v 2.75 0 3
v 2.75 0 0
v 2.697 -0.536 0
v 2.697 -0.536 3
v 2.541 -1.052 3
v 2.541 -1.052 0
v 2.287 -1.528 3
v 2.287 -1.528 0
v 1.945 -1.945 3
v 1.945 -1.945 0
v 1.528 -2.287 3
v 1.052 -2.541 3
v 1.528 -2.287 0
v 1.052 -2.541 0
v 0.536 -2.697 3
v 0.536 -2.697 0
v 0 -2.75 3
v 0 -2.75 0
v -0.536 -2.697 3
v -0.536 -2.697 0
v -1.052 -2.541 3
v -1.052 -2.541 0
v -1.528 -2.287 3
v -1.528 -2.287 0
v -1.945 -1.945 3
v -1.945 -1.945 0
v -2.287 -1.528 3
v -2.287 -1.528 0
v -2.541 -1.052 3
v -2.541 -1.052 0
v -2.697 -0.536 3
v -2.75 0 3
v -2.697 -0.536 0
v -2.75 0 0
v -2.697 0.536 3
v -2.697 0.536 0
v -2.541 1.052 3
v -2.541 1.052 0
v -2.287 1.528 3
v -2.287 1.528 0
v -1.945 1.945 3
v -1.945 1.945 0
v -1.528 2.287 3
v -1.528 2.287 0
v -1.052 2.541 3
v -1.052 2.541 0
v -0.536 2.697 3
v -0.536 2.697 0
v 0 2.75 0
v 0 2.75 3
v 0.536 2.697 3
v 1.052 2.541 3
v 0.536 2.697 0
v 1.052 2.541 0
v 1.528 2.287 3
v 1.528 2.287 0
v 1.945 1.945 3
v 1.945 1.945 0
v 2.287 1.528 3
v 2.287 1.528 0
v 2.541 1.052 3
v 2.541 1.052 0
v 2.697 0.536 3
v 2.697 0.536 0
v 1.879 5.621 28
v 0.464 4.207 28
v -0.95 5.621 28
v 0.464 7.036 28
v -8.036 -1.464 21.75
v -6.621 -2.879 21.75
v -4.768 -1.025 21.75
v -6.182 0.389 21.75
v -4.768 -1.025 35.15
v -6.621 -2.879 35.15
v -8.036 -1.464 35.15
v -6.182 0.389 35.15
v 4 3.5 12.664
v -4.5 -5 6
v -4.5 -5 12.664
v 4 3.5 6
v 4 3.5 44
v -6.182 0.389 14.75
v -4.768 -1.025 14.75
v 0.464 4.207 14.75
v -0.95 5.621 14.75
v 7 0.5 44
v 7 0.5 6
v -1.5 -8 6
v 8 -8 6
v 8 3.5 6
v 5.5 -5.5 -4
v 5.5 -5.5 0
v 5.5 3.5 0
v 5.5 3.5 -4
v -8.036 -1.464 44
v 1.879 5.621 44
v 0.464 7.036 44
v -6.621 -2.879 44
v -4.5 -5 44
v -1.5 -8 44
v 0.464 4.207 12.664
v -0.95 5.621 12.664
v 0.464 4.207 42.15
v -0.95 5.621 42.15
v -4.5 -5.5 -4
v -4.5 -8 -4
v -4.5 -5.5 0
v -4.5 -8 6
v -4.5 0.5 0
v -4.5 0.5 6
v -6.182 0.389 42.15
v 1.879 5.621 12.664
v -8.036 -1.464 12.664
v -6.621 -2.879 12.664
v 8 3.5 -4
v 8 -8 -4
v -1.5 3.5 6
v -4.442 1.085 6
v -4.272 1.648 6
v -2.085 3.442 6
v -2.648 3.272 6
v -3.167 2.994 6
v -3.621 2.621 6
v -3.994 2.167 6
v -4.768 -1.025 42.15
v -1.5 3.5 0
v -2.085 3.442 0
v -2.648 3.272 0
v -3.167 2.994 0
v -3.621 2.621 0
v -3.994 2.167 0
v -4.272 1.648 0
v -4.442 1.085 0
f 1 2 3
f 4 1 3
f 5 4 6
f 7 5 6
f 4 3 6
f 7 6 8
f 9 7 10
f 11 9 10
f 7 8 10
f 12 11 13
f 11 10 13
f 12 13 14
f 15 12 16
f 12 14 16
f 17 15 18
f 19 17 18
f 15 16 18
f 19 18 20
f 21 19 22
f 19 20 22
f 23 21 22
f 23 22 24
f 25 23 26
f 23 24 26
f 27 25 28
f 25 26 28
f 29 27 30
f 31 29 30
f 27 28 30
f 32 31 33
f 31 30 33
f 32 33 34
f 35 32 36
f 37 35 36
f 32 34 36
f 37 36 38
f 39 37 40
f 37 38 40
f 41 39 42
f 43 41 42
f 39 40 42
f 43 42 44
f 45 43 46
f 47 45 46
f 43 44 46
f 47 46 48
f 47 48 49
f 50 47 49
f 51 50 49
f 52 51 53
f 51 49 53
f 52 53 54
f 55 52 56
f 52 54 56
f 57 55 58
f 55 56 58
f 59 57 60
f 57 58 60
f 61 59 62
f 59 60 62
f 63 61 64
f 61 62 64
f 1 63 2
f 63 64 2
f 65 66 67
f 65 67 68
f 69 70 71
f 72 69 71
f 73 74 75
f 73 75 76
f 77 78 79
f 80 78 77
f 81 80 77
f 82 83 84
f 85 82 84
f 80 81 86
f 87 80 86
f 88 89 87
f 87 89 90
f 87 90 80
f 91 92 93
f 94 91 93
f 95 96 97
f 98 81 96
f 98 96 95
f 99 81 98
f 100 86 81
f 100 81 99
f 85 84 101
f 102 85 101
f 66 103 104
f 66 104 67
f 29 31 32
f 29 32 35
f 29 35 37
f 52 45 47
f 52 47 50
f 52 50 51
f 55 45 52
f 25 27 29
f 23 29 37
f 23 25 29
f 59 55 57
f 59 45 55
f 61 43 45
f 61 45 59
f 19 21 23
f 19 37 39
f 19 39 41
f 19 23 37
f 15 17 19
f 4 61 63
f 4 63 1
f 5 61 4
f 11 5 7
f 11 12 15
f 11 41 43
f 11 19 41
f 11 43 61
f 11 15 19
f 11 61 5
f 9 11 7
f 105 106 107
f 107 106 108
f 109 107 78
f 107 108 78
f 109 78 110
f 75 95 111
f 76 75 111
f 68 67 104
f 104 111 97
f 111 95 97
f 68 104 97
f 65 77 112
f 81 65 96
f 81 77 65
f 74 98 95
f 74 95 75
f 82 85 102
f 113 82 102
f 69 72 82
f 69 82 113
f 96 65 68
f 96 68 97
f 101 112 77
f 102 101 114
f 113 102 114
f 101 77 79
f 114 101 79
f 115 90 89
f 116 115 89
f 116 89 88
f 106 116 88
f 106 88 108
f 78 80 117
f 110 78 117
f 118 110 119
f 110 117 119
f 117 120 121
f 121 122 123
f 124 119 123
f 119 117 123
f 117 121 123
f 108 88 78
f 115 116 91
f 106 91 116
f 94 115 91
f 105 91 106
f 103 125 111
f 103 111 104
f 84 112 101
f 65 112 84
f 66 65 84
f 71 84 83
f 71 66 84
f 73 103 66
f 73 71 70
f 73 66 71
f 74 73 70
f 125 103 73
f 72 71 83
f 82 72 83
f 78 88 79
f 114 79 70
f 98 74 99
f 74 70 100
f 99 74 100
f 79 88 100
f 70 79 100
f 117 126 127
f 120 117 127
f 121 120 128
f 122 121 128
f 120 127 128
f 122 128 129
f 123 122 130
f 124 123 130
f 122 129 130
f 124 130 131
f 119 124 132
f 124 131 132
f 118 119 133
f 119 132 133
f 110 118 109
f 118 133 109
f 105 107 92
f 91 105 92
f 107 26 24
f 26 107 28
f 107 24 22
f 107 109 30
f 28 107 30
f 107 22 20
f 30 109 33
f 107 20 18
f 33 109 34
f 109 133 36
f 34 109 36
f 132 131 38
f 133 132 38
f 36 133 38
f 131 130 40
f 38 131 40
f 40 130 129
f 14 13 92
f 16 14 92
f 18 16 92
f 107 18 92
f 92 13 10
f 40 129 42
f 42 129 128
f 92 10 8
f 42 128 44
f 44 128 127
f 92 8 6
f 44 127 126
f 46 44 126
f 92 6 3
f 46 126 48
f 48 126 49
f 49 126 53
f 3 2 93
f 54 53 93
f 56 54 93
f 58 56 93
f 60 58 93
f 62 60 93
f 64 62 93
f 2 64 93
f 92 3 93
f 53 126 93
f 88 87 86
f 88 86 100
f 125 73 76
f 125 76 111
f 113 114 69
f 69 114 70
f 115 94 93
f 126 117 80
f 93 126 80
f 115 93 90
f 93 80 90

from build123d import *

# Parameters (mm, degrees)
PAD003_DEPTH    = 6
PAD022_DEPTH    = 10
SKETCH041_R     = 2.75
POCKET007_DEPTH = 3
PAD023_DEPTH    = 38
SKETCH043_W     = 12.020815
SKETCH043_H     = 31.3359
PAD024_DEPTH    = 3
PAD025_DEPTH    = 2


with BuildPart() as part:
    # Sketch013 → Pad003 (new body)
    with BuildSketch(Plane.XY):
        with BuildLine():
            Line((5.5, -5.5), (5.5, 3.5))
            Line((5.5, 3.5), (-1.5, 3.5))
            ThreePointArc((-1.5, 3.5), (-3.62132, 2.62132), (-4.5, 0.5))
            Line((-4.5, 0.5), (-4.5, -5.5))
            Line((-4.5, -5.5), (5.5, -5.5))
        make_face()
    extrude(amount=PAD003_DEPTH)

    # Sketch040 (on Face7 of Pad003) → Pad022 (new body)
    with BuildSketch(Plane.XY.offset(6)):
        Polygon((5.5, 3.5), (8, 3.5), (8, -8), (-4.5, -8), (-4.5, -5.5), (5.5, -5.5), align=None)
    extrude(amount=-PAD022_DEPTH)

    # Sketch041 (on Face4 of Pad022) → Pocket007 (cut)
    with BuildSketch(Plane(origin=(0, 0, 0), x_dir=(1, 0, 0), z_dir=(0, 0, -1))):
        Circle(SKETCH041_R)
    extrude(amount=-POCKET007_DEPTH, mode=Mode.SUBTRACT)

    # Sketch042 (on Face4 of Pocket007) → Pad023 (new body)
    with BuildSketch(Plane.XY.offset(6)):
        Polygon((-4.5, -5), (4, 3.5), (7, 0.5), (-1.5, -8), align=None)
    extrude(amount=PAD023_DEPTH)

    # Sketch043 (on Face15 of Pad023) → Pad024 (new body)
    with BuildSketch(Plane(origin=(0.25, -0.25, 0), x_dir=(-0.707107, -0.707107, 0), z_dir=(-0.707107, 0.707107, 0))):
        with Locations((0.707107, 28.33205)):
            Rectangle(SKETCH043_W, SKETCH043_H)
    extrude(amount=PAD024_DEPTH)

    # Sketch044 (on Face18 of Pad024) → Pad025 (new body)
    with BuildSketch(Plane(origin=(-1.87132, 1.87132, 0), x_dir=(-0.707107, -0.707107, 0), z_dir=(-0.707107, 0.707107, 0))):
        Polygon((-5.303301, 44), (6.717514, 44), (6.717514, 35.15), (4.096699, 35.15), (4.096699, 42.15), (-3.303301, 42.15), (-3.303301, 28), (-5.303301, 28), align=None)
        Polygon((4.096699, 14.75), (-3.303301, 14.75), (-3.303301, 12.6641), (6.717514, 12.6641), (6.717514, 21.75), (4.096699, 21.75), align=None)
    extrude(amount=PAD025_DEPTH)


solid = part.part
